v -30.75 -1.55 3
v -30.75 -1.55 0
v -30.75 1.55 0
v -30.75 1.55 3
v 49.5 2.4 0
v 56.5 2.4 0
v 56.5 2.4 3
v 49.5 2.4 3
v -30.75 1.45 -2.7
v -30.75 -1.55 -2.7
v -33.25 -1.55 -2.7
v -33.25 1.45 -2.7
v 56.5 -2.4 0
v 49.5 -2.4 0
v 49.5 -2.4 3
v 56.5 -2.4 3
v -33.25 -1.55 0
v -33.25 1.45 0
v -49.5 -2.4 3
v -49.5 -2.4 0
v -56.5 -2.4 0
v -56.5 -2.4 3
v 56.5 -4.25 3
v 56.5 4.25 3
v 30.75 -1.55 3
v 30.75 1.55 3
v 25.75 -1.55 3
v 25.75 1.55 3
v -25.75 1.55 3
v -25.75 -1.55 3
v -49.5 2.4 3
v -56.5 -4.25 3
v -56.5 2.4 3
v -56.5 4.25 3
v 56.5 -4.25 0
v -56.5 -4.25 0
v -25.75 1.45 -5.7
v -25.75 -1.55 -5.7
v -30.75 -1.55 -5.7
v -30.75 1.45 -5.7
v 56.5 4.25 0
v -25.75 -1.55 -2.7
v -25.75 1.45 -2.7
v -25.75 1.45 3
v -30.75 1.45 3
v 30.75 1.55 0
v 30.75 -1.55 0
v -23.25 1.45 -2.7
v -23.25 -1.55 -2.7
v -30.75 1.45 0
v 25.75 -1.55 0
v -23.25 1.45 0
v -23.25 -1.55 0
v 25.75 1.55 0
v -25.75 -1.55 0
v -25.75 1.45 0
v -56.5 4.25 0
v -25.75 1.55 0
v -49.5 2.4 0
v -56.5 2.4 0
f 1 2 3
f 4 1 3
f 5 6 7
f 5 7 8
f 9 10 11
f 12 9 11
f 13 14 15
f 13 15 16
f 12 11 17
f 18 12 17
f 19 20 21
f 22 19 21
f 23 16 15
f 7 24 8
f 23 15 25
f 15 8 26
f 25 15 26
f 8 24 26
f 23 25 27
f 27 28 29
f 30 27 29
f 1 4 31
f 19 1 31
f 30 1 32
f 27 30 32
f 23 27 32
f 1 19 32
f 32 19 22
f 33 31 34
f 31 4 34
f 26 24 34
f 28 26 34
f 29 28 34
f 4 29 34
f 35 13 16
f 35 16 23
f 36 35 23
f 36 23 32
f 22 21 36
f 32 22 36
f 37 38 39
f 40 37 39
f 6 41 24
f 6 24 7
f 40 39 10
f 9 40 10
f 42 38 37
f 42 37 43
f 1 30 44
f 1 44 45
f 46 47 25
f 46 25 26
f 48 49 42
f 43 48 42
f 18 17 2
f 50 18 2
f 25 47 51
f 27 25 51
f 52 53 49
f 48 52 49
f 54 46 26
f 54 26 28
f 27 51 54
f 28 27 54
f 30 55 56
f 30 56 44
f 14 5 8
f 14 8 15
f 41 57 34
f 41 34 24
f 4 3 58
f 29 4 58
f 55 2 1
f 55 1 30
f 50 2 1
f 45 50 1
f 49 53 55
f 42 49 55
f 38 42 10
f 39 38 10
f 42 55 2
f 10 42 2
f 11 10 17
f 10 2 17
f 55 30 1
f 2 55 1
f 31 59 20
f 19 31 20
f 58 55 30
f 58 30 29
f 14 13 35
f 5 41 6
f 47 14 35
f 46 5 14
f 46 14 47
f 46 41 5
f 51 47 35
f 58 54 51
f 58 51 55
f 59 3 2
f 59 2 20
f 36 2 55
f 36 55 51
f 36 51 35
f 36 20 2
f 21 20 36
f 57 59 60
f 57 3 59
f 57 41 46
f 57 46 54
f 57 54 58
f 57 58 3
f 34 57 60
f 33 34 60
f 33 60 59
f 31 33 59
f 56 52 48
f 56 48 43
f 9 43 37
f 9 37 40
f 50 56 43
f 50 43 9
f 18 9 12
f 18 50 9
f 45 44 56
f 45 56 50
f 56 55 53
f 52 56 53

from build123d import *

# Parameters (mm, degrees)
F0_W     = 5
F0_H     = 3.1
F1_DEPTH = 3
F3_W     = 5
F3_H     = 3
F4_DEPTH = 3


# Not quite as in the source:
# - a feature names something its author has since deleted; it is built from what else it names


with BuildPart() as f1:
    # F0 (on Top) → F1 (new body)
    with BuildSketch(Plane.XY):
        Polygon((0, -4.25), (0, 4.25), (-56.5, 4.25), (-56.5, 2.4), (-49.5, 2.4), (-49.5, -2.4), (-56.5, -2.4), (-56.5, -4.25), align=None)
        with Locations((-28.25, 0)):
            Rectangle(F0_W, F0_H, mode=Mode.SUBTRACT)
    extrude(amount=F1_DEPTH)

    # F2: F1 across face


with BuildPart() as f1_1:
    add(f1.part)
    add(f1.part.mirror(Plane(origin=(0, 0, 1.5), x_dir=(0, 1, 0), z_dir=(1, 0, 0))))


with BuildPart() as f4:
    # F3 (on face) → F4 (new body)
    with BuildSketch(Plane(origin=(0, -1.55, 0), x_dir=(-1, 0, 0), z_dir=(0, 1, 0))):
        with Locations((28.25, -4.2)):
            Rectangle(F3_W, F3_H)
        Polygon((30.75, 0), (25.75, 0), (23.25, 0), (23.25, -2.7), (25.75, -2.7), (30.75, -2.7), (33.25, -2.7), (33.25, 0), align=None)
        with Locations((28.25, 1.5)):
            Rectangle(F3_W, F3_H)
    extrude(amount=F4_DEPTH)


solid = Compound([f1_1.part, f4.part])
